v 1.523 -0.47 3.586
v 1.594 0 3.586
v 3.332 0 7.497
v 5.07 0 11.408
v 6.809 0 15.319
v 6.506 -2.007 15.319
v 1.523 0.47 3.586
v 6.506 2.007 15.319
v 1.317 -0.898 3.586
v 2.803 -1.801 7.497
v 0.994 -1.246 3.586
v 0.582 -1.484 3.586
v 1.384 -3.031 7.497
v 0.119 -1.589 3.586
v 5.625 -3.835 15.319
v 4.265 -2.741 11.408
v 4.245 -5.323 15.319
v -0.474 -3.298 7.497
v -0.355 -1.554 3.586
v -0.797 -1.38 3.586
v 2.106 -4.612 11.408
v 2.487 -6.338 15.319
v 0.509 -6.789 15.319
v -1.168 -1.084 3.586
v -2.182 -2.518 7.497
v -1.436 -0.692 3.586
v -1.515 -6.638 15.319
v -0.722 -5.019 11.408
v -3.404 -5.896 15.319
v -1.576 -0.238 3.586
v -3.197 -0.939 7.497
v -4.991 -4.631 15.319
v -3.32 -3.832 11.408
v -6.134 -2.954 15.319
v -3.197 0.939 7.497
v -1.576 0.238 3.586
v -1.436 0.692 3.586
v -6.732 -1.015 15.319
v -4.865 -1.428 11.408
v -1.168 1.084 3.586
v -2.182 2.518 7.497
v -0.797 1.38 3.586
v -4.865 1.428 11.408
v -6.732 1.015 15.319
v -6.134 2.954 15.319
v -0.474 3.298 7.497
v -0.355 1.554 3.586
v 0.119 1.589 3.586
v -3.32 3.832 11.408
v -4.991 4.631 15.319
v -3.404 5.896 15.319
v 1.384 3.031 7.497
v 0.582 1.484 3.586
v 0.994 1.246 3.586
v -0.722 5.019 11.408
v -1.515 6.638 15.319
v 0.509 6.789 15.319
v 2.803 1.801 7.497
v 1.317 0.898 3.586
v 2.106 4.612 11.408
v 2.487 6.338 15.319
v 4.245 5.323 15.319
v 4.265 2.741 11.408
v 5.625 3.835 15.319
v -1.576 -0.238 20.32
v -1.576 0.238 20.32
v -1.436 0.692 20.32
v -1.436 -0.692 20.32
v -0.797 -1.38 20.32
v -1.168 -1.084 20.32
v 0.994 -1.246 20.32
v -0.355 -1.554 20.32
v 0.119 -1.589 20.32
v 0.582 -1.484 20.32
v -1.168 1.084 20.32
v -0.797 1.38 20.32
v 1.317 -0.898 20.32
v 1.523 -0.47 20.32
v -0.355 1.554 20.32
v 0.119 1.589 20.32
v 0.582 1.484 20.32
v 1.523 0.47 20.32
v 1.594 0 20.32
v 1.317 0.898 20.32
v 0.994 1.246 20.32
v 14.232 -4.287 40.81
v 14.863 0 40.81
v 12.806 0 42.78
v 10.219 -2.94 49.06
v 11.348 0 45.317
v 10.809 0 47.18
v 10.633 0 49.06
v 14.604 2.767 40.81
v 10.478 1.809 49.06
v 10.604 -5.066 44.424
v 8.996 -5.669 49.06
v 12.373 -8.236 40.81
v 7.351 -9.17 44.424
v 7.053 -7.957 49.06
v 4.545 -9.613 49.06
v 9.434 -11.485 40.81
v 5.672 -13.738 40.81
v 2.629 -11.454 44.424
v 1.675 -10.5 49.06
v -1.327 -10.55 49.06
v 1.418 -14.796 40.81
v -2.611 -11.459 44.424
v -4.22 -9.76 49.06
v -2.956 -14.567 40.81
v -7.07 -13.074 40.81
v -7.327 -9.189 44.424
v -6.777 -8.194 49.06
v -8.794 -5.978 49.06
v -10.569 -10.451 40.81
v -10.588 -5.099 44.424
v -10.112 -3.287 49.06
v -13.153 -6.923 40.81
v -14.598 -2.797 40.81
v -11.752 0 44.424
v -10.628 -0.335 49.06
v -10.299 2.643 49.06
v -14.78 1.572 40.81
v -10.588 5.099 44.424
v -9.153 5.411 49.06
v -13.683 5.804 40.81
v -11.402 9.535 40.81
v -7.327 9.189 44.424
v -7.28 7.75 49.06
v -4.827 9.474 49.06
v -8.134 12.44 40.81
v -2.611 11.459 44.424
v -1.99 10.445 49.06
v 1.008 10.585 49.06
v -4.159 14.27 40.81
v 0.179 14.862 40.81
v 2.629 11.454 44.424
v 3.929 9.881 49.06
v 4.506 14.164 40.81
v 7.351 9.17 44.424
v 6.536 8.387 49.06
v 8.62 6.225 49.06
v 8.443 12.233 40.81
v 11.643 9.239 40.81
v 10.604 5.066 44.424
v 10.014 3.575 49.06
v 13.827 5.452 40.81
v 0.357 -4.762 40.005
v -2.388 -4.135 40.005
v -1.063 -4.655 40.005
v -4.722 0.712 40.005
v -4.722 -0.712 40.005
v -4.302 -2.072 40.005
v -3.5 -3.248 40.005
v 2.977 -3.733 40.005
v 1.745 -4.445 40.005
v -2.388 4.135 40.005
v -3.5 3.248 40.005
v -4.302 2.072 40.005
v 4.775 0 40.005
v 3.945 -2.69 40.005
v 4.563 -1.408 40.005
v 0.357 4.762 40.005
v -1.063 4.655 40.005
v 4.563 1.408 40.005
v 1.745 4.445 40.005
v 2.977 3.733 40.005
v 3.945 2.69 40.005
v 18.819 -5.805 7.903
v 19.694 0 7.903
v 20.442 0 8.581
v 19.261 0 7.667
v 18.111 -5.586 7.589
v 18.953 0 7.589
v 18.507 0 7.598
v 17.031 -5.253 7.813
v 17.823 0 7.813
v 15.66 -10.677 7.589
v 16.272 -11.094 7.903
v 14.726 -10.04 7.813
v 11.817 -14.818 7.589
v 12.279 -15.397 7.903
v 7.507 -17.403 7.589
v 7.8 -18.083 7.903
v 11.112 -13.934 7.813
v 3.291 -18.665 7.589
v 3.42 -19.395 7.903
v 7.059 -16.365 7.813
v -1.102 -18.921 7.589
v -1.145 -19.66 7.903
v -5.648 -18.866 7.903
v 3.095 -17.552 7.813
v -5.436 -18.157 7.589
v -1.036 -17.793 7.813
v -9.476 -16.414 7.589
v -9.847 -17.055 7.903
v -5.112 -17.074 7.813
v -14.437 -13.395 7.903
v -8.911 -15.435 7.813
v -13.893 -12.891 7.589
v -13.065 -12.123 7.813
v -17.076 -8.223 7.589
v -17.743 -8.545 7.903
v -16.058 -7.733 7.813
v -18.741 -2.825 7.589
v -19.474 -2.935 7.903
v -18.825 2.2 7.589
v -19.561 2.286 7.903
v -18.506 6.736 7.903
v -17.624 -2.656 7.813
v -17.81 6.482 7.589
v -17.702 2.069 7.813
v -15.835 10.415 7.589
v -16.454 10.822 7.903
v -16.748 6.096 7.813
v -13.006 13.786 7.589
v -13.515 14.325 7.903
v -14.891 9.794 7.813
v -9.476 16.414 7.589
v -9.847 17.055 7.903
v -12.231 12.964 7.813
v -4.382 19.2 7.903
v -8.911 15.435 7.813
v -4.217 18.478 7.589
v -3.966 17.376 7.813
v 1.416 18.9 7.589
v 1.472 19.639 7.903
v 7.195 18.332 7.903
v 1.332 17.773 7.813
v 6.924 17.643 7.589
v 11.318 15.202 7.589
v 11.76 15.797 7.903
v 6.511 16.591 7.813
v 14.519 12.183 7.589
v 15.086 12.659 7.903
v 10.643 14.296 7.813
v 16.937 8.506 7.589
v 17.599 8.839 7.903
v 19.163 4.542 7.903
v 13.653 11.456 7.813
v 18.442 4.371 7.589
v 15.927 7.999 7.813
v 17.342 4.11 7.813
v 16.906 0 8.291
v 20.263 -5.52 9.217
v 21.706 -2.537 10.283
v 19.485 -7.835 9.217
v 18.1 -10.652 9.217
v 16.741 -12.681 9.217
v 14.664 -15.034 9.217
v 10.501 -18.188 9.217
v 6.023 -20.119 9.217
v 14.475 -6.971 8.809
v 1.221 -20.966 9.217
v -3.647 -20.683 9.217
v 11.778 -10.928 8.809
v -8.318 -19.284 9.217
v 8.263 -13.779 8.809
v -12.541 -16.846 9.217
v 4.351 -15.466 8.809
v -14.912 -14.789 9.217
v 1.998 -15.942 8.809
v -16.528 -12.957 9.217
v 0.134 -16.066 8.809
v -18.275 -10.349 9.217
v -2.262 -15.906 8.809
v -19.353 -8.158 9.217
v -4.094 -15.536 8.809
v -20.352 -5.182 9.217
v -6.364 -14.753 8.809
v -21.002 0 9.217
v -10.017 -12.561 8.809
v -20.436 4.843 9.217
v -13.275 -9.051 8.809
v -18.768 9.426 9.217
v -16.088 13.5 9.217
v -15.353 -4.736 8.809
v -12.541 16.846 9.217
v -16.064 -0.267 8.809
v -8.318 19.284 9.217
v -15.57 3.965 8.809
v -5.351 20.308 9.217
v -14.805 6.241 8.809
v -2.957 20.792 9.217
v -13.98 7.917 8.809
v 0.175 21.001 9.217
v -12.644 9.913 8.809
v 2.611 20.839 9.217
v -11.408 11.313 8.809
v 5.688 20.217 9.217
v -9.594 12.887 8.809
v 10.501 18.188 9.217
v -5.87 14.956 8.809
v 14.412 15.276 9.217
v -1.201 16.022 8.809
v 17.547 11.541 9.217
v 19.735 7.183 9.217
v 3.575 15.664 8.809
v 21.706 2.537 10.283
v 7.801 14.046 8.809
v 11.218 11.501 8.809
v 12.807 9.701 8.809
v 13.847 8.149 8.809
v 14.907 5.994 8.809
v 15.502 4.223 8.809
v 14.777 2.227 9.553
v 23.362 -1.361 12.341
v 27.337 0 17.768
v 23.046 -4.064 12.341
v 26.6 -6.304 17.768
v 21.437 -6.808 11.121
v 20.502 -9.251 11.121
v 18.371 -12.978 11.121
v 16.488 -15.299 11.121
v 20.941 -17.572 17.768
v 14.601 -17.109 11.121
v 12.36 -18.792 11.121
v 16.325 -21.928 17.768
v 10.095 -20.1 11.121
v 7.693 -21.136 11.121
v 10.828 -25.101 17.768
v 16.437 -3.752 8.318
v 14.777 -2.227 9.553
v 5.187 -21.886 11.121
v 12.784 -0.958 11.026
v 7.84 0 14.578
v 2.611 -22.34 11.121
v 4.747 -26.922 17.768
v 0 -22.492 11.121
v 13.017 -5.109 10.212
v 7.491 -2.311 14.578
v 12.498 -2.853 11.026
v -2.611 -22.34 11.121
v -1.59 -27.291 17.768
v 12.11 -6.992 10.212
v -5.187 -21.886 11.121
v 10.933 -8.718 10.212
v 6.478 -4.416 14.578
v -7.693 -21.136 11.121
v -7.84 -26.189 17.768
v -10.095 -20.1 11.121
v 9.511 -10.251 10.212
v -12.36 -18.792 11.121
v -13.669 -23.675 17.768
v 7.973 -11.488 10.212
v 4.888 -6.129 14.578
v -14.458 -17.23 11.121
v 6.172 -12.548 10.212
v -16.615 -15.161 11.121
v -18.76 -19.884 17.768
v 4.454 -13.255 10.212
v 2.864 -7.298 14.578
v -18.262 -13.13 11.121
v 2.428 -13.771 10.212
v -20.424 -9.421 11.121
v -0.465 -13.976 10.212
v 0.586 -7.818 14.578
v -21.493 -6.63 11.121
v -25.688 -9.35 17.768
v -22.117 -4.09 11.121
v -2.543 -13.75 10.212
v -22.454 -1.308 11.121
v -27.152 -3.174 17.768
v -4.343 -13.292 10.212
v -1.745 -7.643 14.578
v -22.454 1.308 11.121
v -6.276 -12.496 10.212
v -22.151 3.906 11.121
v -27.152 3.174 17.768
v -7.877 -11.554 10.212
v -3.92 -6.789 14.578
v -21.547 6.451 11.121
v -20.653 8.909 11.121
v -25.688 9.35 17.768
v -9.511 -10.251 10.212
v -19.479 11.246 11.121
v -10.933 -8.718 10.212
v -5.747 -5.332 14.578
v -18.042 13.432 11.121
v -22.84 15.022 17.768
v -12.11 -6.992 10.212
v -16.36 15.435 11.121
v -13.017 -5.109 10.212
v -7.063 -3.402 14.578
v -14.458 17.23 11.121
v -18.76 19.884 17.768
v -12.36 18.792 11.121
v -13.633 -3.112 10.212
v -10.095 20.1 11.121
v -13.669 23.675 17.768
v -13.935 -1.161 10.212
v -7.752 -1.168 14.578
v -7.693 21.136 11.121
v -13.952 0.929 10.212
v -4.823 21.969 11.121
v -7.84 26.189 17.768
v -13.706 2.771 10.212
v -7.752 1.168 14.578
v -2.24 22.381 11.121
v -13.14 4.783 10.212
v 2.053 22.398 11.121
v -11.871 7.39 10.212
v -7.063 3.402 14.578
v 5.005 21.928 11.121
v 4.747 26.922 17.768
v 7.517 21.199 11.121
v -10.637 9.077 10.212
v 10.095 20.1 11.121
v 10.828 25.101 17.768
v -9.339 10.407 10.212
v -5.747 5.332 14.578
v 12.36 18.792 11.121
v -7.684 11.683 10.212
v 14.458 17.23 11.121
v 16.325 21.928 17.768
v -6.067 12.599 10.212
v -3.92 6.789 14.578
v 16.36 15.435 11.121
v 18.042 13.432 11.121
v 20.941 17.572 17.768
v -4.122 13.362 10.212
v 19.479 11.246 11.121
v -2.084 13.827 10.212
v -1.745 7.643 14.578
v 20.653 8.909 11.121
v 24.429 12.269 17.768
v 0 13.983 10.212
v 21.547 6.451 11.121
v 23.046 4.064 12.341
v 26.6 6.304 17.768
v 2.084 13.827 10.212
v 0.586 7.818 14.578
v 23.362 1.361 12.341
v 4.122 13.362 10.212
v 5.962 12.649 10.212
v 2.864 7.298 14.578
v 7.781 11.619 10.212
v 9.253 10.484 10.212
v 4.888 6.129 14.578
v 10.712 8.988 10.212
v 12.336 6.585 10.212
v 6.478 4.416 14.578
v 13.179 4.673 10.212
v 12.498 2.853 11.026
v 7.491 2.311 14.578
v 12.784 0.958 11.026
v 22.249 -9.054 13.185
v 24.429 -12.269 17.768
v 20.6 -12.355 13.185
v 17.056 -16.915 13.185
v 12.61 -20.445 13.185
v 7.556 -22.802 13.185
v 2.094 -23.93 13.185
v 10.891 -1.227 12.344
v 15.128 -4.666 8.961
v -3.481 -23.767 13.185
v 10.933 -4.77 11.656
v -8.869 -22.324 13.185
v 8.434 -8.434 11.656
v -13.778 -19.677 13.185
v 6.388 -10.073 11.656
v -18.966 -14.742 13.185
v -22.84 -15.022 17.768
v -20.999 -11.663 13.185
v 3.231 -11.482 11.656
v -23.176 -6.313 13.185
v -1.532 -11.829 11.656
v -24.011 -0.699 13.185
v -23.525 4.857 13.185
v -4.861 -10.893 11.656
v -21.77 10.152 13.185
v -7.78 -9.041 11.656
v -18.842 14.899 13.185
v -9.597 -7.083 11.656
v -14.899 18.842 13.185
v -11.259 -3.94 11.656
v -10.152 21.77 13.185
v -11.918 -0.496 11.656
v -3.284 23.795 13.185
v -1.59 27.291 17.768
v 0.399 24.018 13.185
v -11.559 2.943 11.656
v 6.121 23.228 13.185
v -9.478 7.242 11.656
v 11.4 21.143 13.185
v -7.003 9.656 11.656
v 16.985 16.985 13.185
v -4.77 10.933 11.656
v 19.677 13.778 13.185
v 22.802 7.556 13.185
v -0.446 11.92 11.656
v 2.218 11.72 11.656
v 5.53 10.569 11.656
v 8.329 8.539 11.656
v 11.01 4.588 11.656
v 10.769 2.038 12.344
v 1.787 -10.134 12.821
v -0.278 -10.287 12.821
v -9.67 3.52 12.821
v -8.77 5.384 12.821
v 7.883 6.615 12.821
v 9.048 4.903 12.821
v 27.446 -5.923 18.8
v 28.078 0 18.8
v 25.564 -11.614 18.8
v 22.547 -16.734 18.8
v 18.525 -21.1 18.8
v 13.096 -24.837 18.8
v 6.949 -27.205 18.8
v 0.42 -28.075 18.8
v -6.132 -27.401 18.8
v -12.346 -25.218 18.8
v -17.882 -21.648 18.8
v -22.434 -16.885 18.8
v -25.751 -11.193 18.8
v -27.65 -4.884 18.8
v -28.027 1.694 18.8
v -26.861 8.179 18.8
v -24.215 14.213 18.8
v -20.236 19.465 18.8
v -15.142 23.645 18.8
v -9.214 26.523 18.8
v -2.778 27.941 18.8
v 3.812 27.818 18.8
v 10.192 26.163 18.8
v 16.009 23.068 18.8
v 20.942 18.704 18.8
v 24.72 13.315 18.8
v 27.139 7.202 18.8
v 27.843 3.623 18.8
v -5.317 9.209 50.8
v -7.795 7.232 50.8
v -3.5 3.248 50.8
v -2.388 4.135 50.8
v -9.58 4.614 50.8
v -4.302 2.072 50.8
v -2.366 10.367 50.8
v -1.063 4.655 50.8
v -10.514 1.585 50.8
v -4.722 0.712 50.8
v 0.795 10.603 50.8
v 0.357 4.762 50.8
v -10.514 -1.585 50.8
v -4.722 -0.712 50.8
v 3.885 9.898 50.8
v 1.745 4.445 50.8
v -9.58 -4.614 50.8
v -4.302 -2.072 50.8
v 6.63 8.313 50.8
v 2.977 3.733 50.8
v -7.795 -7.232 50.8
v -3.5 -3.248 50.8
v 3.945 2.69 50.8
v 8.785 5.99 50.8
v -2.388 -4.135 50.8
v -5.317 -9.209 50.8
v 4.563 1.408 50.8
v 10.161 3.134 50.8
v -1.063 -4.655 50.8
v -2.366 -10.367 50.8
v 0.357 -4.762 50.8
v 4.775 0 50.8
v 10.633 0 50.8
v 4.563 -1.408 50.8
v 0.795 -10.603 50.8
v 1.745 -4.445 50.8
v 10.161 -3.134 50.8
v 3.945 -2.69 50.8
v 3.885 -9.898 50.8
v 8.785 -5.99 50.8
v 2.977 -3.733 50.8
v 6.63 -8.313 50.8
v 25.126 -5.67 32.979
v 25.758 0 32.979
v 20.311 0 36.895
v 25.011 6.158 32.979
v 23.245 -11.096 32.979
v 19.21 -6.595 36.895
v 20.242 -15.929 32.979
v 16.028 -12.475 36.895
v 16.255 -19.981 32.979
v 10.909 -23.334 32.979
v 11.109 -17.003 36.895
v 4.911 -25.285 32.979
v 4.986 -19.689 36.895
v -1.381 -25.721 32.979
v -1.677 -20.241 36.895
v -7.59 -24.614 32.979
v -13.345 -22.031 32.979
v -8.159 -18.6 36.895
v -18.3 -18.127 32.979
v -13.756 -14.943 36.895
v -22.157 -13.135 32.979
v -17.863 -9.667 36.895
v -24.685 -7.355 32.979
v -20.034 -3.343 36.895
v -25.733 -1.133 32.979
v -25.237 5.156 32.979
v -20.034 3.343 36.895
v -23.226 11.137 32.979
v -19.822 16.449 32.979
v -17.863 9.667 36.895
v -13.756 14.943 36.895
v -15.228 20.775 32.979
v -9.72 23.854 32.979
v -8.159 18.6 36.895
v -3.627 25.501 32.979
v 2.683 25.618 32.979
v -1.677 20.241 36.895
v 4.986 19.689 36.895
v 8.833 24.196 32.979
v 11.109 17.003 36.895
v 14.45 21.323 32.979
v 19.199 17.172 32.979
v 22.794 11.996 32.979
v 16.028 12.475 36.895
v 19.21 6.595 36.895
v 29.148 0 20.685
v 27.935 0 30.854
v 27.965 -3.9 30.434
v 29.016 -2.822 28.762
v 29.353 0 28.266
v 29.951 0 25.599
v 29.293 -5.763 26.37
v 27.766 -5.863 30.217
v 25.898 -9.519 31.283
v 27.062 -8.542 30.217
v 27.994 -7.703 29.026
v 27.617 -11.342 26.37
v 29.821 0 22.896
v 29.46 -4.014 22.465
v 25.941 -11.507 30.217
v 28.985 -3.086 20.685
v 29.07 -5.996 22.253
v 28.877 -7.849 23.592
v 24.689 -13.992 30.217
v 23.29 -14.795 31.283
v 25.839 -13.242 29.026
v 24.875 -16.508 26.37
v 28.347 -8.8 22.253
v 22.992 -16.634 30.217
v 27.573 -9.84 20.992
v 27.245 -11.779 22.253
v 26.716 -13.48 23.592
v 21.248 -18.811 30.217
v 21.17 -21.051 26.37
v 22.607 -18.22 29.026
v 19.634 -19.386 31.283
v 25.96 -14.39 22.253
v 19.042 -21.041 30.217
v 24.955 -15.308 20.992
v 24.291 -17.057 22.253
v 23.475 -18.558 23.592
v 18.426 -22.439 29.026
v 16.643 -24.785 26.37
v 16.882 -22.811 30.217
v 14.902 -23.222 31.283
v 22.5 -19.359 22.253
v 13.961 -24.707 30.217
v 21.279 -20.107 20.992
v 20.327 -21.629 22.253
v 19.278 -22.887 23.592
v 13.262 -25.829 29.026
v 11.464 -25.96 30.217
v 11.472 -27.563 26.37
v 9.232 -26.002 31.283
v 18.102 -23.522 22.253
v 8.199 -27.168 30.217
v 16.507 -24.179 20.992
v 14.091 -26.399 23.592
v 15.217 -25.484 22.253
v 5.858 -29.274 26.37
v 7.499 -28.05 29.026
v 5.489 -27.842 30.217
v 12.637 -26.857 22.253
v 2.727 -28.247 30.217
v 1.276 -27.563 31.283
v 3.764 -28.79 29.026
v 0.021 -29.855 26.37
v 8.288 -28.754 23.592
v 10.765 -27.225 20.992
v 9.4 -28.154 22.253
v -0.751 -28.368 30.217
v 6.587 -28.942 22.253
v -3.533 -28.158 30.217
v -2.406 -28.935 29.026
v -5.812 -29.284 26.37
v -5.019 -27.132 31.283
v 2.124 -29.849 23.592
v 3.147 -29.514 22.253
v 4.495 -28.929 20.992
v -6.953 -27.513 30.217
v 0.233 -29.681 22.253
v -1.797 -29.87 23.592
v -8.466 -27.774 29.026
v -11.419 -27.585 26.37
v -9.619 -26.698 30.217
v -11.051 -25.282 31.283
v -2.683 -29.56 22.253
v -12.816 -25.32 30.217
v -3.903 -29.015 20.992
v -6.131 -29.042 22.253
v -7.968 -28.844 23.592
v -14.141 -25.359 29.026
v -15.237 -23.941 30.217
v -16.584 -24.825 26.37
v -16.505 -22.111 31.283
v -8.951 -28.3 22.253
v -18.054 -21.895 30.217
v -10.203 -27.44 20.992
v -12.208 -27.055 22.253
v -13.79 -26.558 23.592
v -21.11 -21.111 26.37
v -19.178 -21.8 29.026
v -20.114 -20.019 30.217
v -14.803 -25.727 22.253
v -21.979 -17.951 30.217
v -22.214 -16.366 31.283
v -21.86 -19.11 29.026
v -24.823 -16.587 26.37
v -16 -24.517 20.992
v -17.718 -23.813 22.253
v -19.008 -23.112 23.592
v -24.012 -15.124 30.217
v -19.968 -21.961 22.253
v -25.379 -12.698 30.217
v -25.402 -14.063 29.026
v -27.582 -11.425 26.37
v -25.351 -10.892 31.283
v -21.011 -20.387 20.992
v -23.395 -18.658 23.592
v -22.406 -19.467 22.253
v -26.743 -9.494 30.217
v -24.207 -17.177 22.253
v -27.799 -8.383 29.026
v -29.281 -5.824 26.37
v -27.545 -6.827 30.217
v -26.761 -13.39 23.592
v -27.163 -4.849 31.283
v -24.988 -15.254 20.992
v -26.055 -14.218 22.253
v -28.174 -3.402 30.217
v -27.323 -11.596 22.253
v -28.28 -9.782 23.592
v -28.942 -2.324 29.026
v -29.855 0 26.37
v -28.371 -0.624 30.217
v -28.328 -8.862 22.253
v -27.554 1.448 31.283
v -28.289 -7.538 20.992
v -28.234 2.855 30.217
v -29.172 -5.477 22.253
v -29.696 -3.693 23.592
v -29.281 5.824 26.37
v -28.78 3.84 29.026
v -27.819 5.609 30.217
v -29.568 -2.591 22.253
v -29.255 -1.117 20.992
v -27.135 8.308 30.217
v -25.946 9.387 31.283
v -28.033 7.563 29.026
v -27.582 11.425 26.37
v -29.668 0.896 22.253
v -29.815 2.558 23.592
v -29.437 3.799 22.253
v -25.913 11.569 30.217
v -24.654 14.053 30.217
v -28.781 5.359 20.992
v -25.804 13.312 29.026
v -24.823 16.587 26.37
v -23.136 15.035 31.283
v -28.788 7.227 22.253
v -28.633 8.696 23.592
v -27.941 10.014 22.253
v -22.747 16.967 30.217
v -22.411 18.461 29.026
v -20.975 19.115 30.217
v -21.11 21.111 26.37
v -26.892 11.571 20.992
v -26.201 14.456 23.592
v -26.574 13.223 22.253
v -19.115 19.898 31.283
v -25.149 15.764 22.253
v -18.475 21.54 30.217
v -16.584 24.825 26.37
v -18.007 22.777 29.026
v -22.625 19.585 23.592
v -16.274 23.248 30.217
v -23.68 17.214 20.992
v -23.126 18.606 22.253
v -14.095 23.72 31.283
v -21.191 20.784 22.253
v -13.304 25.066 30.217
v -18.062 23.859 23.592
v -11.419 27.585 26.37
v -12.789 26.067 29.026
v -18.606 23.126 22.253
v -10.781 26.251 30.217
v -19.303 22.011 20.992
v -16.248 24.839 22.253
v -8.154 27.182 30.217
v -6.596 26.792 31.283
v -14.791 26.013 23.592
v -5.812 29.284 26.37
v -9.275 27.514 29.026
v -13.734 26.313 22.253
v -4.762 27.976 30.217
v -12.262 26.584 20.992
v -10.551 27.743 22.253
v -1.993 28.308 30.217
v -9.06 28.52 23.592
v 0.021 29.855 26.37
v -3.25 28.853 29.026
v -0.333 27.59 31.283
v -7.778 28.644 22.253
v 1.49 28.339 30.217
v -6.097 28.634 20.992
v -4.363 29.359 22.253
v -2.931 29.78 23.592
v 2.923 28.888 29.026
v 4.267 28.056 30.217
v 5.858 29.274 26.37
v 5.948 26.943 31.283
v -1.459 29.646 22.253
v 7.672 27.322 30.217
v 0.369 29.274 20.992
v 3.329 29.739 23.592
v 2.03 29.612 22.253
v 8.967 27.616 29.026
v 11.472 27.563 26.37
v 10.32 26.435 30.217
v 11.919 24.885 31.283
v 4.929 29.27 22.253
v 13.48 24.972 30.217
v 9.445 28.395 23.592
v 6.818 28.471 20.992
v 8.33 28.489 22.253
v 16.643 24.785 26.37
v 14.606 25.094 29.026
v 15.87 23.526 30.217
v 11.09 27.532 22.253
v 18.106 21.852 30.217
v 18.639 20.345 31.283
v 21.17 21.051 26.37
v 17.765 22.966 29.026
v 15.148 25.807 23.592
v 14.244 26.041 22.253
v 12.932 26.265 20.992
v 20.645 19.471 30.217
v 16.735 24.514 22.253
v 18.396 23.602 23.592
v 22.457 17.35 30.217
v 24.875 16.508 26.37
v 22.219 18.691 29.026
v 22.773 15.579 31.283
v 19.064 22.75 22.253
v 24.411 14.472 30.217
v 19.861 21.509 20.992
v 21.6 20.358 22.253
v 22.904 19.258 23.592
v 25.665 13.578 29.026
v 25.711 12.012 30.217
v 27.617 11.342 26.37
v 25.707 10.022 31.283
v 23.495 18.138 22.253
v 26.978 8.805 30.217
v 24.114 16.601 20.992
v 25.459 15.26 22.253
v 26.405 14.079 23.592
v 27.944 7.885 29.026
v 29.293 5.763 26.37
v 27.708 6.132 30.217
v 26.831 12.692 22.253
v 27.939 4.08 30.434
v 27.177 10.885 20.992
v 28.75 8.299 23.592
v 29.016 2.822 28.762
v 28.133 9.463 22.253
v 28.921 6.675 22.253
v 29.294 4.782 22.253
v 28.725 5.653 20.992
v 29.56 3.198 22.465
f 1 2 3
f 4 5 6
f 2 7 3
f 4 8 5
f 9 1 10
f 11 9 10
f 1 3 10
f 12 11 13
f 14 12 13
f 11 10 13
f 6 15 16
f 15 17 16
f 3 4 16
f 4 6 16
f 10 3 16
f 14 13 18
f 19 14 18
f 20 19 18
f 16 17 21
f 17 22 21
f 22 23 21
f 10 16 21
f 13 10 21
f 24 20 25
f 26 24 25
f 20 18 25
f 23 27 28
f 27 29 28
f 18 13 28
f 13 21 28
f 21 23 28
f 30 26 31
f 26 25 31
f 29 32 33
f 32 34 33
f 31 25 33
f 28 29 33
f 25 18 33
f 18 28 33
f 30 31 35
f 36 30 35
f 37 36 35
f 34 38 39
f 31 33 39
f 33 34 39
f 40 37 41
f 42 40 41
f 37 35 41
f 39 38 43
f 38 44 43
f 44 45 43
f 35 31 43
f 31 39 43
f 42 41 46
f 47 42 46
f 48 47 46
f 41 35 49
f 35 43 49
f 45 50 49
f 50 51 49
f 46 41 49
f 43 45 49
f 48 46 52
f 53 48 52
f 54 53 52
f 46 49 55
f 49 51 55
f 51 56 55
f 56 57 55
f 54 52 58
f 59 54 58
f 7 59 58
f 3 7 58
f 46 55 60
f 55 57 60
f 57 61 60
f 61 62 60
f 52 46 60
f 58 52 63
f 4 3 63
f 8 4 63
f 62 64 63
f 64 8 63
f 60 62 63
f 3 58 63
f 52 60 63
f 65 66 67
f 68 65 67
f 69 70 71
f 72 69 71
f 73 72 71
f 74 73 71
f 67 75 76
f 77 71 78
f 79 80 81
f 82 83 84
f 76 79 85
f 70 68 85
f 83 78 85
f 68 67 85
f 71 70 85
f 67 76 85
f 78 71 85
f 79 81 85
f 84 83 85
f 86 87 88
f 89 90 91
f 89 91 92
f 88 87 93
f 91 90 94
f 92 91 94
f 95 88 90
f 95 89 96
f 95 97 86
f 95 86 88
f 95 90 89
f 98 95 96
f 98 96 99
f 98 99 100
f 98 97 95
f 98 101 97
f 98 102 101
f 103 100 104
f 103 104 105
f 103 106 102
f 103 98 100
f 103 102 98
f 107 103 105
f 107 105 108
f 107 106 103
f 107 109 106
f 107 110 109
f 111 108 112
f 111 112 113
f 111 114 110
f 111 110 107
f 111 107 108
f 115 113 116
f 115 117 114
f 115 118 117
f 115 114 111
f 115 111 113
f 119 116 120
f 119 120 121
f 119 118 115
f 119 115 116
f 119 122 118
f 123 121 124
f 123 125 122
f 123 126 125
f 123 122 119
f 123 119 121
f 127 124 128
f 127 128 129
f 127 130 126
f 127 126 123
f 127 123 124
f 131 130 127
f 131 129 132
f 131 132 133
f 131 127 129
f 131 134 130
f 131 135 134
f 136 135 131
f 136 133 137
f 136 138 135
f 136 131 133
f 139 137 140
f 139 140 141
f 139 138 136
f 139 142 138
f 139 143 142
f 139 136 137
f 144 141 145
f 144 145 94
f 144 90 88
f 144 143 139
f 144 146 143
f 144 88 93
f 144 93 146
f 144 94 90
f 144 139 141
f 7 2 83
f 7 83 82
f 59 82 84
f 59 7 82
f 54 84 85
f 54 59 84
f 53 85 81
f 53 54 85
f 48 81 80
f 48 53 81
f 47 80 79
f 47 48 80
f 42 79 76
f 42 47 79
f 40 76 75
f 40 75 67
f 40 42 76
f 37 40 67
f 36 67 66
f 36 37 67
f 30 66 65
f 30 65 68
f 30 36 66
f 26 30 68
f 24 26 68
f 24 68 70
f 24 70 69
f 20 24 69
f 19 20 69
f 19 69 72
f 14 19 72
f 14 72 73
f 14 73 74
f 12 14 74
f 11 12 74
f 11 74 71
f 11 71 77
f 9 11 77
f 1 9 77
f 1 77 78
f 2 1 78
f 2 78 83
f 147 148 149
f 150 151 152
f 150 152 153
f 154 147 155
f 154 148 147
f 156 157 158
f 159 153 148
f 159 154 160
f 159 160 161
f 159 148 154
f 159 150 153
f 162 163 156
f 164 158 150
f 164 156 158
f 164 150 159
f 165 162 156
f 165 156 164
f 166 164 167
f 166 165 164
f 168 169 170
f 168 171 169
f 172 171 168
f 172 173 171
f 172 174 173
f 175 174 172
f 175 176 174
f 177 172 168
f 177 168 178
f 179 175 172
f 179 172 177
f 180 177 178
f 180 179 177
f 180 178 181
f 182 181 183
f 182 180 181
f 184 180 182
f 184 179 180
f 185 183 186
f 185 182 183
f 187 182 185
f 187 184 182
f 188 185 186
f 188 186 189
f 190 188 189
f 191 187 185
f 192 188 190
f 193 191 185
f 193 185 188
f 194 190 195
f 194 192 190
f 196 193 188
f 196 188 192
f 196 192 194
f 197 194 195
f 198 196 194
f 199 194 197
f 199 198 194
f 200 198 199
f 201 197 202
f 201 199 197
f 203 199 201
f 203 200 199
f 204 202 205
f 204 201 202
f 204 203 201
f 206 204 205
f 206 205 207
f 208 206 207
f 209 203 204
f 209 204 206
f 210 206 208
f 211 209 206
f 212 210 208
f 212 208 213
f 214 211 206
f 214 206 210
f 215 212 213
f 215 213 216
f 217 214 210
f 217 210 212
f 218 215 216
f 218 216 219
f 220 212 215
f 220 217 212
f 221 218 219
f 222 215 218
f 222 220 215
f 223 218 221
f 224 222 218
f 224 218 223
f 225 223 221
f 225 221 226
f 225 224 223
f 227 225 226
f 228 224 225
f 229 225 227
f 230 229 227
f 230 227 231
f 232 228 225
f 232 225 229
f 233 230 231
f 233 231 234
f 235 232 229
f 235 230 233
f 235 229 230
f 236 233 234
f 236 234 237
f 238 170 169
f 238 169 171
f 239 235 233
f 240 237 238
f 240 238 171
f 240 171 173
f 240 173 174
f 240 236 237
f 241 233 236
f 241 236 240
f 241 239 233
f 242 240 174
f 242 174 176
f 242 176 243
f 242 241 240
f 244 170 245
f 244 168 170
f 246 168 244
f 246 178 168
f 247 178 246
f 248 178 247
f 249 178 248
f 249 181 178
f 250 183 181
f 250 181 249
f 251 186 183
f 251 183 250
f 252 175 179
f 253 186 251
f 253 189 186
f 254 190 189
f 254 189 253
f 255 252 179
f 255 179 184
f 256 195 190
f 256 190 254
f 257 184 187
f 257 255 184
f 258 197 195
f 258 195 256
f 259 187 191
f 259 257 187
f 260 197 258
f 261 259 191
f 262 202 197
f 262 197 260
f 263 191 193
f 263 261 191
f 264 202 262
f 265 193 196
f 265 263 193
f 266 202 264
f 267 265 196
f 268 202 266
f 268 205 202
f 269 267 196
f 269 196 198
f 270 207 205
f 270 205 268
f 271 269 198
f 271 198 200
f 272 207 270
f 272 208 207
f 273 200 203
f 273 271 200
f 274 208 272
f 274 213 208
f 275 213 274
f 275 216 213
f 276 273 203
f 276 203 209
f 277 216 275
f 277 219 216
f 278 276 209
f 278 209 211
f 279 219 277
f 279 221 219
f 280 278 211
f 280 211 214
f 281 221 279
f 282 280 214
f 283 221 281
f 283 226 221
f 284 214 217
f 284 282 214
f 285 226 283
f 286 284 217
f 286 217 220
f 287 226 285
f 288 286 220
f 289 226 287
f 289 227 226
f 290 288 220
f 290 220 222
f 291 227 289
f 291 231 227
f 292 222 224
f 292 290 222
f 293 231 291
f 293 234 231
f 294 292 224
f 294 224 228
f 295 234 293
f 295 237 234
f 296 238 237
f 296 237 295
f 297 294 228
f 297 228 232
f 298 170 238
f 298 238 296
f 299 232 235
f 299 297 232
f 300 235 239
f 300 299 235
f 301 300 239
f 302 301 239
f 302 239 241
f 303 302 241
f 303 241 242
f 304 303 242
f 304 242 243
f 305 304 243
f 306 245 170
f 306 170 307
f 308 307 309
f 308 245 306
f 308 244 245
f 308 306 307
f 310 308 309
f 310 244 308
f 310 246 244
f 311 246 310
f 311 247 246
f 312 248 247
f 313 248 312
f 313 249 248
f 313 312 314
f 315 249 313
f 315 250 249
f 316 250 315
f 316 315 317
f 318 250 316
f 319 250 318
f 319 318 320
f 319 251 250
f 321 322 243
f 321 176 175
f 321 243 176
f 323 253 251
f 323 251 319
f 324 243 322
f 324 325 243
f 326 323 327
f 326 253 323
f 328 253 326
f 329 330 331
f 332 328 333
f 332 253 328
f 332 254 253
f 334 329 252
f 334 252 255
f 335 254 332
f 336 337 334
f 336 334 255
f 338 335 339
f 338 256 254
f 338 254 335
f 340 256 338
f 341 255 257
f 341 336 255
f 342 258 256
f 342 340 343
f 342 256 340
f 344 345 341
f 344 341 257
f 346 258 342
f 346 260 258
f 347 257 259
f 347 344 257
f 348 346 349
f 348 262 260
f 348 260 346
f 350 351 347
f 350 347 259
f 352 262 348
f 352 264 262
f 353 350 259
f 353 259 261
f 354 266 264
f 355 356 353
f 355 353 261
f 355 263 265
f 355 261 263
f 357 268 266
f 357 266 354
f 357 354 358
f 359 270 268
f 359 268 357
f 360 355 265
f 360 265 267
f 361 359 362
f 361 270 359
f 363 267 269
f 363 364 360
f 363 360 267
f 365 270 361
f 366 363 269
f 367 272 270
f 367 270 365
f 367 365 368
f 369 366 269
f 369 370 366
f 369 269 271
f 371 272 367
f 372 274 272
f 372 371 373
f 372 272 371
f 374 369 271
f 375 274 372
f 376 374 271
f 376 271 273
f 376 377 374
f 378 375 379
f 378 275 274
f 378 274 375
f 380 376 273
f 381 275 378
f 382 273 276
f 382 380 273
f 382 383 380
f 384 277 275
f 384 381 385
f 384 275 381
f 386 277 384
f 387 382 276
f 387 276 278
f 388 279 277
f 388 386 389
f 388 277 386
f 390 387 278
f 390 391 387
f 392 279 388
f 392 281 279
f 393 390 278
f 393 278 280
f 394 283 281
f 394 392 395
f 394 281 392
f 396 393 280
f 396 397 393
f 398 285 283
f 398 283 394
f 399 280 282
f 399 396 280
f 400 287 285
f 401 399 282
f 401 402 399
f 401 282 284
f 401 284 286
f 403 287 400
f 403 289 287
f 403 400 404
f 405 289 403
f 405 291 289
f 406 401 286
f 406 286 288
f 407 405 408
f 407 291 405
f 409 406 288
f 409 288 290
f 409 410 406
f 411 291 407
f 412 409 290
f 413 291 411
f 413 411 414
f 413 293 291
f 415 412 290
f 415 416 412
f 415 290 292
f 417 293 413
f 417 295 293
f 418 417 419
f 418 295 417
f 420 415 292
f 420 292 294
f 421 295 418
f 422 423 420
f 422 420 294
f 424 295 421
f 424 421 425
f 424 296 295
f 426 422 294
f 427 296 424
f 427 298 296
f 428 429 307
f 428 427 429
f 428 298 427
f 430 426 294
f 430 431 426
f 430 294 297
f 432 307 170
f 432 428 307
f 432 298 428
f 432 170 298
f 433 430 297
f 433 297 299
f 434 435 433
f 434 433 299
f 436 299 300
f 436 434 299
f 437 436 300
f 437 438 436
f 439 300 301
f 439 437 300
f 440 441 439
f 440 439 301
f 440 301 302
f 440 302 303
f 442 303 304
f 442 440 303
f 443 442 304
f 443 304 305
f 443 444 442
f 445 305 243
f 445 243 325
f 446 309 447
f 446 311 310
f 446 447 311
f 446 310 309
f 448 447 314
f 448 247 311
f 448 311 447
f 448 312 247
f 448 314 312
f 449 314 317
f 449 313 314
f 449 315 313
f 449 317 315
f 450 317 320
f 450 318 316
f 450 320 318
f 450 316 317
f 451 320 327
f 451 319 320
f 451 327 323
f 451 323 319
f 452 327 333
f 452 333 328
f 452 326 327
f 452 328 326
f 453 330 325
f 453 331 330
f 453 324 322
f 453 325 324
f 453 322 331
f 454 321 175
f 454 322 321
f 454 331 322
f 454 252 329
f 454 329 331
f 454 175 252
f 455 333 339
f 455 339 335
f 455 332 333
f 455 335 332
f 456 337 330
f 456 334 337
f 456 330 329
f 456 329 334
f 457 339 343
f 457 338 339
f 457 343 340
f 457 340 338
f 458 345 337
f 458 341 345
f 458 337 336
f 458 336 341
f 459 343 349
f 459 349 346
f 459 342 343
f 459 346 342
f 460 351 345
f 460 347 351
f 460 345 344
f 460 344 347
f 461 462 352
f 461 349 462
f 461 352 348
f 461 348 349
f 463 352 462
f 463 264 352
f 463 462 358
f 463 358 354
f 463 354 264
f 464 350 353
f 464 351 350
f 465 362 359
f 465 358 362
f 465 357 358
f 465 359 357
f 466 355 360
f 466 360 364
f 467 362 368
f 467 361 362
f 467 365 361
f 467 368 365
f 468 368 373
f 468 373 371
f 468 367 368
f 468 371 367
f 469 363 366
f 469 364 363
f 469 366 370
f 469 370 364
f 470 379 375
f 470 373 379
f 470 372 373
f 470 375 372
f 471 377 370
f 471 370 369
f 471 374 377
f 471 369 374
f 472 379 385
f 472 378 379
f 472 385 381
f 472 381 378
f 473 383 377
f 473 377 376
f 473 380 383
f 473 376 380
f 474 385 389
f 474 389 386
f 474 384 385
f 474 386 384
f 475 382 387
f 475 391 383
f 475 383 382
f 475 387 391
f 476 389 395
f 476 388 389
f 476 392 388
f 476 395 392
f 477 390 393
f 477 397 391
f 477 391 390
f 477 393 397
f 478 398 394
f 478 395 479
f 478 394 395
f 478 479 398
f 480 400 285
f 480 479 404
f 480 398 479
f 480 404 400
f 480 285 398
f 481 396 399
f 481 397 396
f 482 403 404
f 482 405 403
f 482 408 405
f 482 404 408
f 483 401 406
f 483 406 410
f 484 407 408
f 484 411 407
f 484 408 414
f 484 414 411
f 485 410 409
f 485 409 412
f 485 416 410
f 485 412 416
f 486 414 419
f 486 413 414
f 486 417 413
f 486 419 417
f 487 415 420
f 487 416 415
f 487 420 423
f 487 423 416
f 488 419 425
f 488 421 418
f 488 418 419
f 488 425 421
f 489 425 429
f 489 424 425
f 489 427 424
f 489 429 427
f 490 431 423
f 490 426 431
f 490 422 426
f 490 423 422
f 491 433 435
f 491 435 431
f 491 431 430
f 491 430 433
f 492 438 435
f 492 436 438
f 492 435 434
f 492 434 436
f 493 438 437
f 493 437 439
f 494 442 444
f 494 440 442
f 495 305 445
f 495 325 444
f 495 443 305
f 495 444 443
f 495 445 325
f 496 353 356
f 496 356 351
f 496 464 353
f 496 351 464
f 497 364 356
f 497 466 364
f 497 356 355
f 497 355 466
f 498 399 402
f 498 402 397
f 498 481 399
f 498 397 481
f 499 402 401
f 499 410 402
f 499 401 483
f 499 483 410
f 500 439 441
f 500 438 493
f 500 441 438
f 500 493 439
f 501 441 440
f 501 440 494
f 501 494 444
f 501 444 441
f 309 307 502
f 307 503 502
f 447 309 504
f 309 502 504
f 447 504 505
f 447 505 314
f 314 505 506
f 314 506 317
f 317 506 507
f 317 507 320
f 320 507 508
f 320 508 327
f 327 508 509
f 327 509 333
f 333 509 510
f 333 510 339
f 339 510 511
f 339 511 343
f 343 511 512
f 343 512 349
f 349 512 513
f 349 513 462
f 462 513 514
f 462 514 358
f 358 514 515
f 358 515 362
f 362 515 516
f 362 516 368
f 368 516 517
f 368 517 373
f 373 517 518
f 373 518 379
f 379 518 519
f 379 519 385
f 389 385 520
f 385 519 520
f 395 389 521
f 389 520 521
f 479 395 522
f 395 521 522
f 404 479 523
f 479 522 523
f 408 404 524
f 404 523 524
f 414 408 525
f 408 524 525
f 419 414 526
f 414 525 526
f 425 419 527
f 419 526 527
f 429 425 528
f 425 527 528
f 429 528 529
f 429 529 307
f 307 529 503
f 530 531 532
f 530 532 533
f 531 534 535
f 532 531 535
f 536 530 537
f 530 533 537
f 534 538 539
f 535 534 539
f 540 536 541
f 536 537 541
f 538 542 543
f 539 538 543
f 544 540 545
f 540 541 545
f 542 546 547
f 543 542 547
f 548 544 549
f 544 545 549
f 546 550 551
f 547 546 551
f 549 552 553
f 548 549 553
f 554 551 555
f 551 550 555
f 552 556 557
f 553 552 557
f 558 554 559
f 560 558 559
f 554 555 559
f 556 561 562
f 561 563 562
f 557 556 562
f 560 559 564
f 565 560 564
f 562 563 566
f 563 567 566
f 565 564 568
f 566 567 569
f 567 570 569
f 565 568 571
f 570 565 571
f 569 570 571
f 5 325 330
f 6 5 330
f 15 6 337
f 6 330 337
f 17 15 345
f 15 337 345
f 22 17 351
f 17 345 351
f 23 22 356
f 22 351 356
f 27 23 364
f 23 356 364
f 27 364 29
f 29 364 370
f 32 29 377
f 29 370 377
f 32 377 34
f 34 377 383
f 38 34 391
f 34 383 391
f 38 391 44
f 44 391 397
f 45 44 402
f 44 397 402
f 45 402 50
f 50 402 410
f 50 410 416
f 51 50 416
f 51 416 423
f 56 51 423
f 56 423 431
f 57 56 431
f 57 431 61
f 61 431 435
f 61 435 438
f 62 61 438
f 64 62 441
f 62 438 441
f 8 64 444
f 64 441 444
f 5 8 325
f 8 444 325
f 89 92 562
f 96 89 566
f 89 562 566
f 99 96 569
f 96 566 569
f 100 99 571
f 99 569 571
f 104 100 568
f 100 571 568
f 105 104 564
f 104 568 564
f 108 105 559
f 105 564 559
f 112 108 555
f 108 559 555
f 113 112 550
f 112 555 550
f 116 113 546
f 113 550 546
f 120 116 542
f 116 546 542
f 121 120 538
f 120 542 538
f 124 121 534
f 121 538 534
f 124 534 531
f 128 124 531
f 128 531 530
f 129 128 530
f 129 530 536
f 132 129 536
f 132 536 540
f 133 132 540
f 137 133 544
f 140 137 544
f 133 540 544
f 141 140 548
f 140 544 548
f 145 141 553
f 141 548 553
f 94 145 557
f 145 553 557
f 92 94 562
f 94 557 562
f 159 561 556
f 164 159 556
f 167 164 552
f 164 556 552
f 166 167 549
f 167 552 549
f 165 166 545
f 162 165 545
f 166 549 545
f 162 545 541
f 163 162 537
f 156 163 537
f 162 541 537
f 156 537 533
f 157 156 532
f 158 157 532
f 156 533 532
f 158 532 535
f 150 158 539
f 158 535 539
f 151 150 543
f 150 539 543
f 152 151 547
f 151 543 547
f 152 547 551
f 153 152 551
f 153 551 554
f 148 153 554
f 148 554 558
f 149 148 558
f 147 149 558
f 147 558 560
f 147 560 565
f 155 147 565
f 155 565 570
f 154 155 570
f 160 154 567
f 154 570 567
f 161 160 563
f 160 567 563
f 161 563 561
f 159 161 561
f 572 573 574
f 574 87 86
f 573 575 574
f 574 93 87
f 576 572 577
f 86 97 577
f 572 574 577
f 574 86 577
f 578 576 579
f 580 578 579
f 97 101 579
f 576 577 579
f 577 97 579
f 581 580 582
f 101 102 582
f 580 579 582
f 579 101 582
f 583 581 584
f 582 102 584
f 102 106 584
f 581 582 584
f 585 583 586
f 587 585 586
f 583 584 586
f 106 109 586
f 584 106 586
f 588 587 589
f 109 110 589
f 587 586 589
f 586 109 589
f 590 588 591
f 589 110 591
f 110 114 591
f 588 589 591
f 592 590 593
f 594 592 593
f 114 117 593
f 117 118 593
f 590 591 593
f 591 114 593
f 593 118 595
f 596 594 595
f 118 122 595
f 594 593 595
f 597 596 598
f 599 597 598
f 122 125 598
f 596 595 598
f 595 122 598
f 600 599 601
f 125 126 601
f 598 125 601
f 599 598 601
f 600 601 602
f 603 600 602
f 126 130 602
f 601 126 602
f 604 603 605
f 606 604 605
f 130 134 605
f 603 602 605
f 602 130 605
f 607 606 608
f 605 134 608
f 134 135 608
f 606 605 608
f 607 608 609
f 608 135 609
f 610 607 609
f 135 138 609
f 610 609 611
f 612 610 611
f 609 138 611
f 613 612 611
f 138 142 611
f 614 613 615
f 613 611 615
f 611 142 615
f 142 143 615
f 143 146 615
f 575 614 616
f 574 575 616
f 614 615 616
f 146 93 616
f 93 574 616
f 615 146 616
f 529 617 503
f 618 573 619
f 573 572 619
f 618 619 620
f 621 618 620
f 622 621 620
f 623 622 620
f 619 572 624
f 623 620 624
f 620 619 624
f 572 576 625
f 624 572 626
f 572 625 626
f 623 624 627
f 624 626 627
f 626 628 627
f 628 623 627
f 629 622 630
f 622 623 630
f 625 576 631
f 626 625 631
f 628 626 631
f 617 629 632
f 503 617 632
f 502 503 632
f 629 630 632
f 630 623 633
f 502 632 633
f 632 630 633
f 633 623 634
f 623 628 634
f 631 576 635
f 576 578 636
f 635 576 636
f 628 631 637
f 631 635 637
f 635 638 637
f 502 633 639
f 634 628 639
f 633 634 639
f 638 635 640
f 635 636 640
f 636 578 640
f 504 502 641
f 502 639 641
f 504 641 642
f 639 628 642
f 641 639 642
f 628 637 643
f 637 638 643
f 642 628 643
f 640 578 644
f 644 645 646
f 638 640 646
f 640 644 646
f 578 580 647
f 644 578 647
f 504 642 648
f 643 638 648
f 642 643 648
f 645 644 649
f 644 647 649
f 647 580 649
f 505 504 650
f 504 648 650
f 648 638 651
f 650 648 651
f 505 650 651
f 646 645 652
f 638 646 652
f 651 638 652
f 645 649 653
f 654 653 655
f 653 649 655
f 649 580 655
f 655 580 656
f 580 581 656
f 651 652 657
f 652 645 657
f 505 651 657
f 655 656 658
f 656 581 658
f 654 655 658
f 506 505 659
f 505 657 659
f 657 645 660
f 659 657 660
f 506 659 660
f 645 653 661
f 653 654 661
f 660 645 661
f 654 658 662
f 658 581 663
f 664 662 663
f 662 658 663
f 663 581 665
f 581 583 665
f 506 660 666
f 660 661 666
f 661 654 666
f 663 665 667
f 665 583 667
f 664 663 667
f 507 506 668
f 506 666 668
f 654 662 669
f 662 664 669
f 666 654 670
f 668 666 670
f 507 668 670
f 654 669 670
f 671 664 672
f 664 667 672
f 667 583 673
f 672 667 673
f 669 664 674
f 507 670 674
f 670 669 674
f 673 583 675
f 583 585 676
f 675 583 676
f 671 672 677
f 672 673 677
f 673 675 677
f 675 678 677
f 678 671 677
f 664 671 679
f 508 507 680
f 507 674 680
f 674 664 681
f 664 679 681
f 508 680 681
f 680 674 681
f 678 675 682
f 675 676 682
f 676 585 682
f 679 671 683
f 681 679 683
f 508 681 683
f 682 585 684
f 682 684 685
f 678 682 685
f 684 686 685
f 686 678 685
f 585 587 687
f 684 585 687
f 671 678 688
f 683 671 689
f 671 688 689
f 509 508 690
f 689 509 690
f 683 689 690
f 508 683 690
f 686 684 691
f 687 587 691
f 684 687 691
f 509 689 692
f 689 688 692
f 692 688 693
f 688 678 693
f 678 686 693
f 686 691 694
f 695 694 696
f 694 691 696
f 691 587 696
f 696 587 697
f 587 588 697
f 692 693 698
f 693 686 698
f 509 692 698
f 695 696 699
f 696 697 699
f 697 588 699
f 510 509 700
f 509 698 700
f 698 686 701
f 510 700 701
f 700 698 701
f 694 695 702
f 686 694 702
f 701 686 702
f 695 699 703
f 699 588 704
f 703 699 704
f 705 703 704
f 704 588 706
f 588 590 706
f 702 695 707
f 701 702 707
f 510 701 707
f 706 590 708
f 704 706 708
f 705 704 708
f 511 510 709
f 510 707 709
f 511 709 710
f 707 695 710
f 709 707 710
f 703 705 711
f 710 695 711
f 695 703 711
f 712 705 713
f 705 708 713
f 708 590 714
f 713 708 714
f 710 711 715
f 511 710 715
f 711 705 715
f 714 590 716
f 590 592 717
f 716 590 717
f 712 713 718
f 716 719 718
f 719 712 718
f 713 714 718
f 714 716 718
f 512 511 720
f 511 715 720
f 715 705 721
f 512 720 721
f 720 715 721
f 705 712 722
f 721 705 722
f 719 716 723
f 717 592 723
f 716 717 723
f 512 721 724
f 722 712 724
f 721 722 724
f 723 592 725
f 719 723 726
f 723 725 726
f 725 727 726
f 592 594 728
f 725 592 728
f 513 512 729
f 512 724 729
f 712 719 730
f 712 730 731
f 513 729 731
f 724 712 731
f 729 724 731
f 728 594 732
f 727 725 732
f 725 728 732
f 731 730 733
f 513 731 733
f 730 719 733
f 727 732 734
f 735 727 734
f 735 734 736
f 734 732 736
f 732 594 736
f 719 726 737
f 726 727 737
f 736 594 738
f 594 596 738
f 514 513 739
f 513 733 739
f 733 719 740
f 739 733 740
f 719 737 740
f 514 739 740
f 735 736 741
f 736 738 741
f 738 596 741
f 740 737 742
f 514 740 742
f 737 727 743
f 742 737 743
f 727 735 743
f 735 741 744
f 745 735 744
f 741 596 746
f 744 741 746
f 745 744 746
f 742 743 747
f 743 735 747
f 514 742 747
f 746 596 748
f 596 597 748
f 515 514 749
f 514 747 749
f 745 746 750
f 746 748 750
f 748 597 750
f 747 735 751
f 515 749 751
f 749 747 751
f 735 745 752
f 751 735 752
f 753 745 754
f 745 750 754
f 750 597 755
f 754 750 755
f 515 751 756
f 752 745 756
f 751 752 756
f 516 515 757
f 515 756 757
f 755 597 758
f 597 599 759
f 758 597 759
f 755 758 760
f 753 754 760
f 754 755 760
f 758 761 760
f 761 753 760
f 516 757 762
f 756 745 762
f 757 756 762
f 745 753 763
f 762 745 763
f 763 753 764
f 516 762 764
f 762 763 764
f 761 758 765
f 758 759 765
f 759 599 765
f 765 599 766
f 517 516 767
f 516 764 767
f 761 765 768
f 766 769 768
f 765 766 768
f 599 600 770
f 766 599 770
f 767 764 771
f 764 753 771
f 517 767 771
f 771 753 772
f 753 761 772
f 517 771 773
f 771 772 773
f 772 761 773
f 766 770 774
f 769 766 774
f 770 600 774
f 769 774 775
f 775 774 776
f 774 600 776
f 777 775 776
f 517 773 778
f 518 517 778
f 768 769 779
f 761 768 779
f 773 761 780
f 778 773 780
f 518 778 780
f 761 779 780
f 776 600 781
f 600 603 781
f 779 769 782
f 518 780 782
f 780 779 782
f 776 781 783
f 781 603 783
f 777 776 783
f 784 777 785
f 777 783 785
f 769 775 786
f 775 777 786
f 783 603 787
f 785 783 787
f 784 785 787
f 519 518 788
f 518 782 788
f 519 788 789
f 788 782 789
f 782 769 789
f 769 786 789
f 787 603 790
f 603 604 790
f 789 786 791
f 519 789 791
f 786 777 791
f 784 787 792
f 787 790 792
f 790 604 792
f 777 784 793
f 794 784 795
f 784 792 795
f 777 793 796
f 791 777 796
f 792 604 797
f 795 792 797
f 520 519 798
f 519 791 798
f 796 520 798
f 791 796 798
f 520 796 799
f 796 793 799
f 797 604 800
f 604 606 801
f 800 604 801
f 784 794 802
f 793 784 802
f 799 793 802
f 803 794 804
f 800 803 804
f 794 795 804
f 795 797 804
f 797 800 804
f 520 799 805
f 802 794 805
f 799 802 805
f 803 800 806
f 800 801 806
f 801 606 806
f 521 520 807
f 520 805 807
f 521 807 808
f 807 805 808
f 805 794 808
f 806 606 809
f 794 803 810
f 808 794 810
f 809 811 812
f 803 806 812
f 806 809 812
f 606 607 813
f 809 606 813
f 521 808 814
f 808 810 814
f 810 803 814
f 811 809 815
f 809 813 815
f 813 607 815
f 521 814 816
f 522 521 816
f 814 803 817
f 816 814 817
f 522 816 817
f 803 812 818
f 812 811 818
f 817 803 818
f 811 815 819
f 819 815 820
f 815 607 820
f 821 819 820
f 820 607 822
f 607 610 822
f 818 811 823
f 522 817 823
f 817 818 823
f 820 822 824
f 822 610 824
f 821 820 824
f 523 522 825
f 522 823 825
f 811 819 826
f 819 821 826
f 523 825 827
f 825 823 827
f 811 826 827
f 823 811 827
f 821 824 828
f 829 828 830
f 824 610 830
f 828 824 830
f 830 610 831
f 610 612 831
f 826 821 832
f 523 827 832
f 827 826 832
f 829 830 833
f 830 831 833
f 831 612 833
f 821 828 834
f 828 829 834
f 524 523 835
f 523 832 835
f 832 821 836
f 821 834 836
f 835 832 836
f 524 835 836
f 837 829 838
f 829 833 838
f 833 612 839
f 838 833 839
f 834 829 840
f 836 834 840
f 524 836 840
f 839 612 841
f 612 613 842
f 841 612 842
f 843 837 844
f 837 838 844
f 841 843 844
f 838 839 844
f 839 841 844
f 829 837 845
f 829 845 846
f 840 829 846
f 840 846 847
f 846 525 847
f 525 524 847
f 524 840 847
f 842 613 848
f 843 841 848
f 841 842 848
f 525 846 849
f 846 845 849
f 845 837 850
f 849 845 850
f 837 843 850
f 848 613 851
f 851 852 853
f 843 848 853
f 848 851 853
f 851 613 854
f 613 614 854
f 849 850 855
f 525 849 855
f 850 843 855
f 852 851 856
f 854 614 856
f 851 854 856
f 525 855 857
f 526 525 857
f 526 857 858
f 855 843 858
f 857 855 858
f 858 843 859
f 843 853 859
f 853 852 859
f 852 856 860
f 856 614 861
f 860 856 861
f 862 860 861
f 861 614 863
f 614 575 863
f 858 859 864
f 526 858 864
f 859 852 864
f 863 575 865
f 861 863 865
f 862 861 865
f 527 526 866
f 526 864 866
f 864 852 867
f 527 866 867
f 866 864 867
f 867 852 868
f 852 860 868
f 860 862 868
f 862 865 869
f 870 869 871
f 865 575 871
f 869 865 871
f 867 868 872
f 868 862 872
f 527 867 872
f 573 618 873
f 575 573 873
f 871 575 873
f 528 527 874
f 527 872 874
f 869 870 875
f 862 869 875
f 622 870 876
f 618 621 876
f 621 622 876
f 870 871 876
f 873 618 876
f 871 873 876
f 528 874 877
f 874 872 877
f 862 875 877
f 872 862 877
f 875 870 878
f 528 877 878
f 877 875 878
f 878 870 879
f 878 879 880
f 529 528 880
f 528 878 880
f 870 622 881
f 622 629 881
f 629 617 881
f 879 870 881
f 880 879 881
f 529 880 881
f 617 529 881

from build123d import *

# Parameters (mm, degrees)
F2_R     = 10.16
F3_R     = 10.16
F5_R     = 4.7752
F6_DEPTH = 10.795
F7_R     = 1.59385
F8_DEPTH = 20.32


# Not quite as in the source:
# - a fillet or chamfer that OpenCascade refuses, or shapes differently, is made with other operations: its cross-section is extruded or revolved along the edge and cut away or added


with BuildPart() as f1:
    # F0 (on Front) → F1 (revolve)
    with BuildSketch(Plane.XZ):
        Polygon((0, 50.8), (0, 0), (6.8085049027, 15.3191369531), (19.1836198036, 6.4245244719), (34.007973939, 27.0497159733), (10.633115835, 43.8503926785), (10.633115835, 50.8), align=None)
    revolve(axis=Axis((0, 0, 25.4), (0, 0, -1)))

    # F2
    f2_edges = [f1.edges().sort_by_distance(p)[0] for p in [
        (-10.633116, 0, 43.850393),
    ]]
    fillet(f2_edges, radius=F2_R)

    # F3
    f3_edges = [f1.edges().sort_by_distance(p)[0] for p in [
        (24.435674, 0, 33.929805),
        (-14.86337, 0, 40.809895),
        (-34.007974, 0, 27.049716),
    ]]
    fillet(f3_edges, radius=F3_R)

    # F4: fillet of radius 13.97 on 3 edges, made by hand

    # F4_s1 → F4_t2 (revolve, cut)
    with BuildSketch(Plane.XZ):
        with BuildLine():
            add(Edge.make_bspline(
                [(27.337014578, 17.7683797976), (19.1836198036, 6.4245244719), (7.8397644778, 14.5779192464)],
                knots=[0, 0, 0, 1, 1, 1], degree=2, weights=[1, 7.3333333333, 1]))
            Line((7.8397644778, 14.5779192464), (19.1836198036, 6.4245244719))
            Line((19.1836198036, 6.4245244719), (27.337014578, 17.7683797976))
        make_face()
    revolve(axis=Axis((0, 0, 6.4245244719), (0, 0, -1)), mode=Mode.SUBTRACT)

    # F5 (on face) → F6 (cut)
    with BuildSketch(Plane.XY.offset(50.8)):
        Circle(F5_R)
    extrude(amount=-F6_DEPTH, mode=Mode.SUBTRACT)

    # F7 (on Top) → F8 (cut)
    with BuildSketch(Plane.XY):
        Circle(F7_R)
    extrude(amount=F8_DEPTH, mode=Mode.SUBTRACT)


solid = f1.part
